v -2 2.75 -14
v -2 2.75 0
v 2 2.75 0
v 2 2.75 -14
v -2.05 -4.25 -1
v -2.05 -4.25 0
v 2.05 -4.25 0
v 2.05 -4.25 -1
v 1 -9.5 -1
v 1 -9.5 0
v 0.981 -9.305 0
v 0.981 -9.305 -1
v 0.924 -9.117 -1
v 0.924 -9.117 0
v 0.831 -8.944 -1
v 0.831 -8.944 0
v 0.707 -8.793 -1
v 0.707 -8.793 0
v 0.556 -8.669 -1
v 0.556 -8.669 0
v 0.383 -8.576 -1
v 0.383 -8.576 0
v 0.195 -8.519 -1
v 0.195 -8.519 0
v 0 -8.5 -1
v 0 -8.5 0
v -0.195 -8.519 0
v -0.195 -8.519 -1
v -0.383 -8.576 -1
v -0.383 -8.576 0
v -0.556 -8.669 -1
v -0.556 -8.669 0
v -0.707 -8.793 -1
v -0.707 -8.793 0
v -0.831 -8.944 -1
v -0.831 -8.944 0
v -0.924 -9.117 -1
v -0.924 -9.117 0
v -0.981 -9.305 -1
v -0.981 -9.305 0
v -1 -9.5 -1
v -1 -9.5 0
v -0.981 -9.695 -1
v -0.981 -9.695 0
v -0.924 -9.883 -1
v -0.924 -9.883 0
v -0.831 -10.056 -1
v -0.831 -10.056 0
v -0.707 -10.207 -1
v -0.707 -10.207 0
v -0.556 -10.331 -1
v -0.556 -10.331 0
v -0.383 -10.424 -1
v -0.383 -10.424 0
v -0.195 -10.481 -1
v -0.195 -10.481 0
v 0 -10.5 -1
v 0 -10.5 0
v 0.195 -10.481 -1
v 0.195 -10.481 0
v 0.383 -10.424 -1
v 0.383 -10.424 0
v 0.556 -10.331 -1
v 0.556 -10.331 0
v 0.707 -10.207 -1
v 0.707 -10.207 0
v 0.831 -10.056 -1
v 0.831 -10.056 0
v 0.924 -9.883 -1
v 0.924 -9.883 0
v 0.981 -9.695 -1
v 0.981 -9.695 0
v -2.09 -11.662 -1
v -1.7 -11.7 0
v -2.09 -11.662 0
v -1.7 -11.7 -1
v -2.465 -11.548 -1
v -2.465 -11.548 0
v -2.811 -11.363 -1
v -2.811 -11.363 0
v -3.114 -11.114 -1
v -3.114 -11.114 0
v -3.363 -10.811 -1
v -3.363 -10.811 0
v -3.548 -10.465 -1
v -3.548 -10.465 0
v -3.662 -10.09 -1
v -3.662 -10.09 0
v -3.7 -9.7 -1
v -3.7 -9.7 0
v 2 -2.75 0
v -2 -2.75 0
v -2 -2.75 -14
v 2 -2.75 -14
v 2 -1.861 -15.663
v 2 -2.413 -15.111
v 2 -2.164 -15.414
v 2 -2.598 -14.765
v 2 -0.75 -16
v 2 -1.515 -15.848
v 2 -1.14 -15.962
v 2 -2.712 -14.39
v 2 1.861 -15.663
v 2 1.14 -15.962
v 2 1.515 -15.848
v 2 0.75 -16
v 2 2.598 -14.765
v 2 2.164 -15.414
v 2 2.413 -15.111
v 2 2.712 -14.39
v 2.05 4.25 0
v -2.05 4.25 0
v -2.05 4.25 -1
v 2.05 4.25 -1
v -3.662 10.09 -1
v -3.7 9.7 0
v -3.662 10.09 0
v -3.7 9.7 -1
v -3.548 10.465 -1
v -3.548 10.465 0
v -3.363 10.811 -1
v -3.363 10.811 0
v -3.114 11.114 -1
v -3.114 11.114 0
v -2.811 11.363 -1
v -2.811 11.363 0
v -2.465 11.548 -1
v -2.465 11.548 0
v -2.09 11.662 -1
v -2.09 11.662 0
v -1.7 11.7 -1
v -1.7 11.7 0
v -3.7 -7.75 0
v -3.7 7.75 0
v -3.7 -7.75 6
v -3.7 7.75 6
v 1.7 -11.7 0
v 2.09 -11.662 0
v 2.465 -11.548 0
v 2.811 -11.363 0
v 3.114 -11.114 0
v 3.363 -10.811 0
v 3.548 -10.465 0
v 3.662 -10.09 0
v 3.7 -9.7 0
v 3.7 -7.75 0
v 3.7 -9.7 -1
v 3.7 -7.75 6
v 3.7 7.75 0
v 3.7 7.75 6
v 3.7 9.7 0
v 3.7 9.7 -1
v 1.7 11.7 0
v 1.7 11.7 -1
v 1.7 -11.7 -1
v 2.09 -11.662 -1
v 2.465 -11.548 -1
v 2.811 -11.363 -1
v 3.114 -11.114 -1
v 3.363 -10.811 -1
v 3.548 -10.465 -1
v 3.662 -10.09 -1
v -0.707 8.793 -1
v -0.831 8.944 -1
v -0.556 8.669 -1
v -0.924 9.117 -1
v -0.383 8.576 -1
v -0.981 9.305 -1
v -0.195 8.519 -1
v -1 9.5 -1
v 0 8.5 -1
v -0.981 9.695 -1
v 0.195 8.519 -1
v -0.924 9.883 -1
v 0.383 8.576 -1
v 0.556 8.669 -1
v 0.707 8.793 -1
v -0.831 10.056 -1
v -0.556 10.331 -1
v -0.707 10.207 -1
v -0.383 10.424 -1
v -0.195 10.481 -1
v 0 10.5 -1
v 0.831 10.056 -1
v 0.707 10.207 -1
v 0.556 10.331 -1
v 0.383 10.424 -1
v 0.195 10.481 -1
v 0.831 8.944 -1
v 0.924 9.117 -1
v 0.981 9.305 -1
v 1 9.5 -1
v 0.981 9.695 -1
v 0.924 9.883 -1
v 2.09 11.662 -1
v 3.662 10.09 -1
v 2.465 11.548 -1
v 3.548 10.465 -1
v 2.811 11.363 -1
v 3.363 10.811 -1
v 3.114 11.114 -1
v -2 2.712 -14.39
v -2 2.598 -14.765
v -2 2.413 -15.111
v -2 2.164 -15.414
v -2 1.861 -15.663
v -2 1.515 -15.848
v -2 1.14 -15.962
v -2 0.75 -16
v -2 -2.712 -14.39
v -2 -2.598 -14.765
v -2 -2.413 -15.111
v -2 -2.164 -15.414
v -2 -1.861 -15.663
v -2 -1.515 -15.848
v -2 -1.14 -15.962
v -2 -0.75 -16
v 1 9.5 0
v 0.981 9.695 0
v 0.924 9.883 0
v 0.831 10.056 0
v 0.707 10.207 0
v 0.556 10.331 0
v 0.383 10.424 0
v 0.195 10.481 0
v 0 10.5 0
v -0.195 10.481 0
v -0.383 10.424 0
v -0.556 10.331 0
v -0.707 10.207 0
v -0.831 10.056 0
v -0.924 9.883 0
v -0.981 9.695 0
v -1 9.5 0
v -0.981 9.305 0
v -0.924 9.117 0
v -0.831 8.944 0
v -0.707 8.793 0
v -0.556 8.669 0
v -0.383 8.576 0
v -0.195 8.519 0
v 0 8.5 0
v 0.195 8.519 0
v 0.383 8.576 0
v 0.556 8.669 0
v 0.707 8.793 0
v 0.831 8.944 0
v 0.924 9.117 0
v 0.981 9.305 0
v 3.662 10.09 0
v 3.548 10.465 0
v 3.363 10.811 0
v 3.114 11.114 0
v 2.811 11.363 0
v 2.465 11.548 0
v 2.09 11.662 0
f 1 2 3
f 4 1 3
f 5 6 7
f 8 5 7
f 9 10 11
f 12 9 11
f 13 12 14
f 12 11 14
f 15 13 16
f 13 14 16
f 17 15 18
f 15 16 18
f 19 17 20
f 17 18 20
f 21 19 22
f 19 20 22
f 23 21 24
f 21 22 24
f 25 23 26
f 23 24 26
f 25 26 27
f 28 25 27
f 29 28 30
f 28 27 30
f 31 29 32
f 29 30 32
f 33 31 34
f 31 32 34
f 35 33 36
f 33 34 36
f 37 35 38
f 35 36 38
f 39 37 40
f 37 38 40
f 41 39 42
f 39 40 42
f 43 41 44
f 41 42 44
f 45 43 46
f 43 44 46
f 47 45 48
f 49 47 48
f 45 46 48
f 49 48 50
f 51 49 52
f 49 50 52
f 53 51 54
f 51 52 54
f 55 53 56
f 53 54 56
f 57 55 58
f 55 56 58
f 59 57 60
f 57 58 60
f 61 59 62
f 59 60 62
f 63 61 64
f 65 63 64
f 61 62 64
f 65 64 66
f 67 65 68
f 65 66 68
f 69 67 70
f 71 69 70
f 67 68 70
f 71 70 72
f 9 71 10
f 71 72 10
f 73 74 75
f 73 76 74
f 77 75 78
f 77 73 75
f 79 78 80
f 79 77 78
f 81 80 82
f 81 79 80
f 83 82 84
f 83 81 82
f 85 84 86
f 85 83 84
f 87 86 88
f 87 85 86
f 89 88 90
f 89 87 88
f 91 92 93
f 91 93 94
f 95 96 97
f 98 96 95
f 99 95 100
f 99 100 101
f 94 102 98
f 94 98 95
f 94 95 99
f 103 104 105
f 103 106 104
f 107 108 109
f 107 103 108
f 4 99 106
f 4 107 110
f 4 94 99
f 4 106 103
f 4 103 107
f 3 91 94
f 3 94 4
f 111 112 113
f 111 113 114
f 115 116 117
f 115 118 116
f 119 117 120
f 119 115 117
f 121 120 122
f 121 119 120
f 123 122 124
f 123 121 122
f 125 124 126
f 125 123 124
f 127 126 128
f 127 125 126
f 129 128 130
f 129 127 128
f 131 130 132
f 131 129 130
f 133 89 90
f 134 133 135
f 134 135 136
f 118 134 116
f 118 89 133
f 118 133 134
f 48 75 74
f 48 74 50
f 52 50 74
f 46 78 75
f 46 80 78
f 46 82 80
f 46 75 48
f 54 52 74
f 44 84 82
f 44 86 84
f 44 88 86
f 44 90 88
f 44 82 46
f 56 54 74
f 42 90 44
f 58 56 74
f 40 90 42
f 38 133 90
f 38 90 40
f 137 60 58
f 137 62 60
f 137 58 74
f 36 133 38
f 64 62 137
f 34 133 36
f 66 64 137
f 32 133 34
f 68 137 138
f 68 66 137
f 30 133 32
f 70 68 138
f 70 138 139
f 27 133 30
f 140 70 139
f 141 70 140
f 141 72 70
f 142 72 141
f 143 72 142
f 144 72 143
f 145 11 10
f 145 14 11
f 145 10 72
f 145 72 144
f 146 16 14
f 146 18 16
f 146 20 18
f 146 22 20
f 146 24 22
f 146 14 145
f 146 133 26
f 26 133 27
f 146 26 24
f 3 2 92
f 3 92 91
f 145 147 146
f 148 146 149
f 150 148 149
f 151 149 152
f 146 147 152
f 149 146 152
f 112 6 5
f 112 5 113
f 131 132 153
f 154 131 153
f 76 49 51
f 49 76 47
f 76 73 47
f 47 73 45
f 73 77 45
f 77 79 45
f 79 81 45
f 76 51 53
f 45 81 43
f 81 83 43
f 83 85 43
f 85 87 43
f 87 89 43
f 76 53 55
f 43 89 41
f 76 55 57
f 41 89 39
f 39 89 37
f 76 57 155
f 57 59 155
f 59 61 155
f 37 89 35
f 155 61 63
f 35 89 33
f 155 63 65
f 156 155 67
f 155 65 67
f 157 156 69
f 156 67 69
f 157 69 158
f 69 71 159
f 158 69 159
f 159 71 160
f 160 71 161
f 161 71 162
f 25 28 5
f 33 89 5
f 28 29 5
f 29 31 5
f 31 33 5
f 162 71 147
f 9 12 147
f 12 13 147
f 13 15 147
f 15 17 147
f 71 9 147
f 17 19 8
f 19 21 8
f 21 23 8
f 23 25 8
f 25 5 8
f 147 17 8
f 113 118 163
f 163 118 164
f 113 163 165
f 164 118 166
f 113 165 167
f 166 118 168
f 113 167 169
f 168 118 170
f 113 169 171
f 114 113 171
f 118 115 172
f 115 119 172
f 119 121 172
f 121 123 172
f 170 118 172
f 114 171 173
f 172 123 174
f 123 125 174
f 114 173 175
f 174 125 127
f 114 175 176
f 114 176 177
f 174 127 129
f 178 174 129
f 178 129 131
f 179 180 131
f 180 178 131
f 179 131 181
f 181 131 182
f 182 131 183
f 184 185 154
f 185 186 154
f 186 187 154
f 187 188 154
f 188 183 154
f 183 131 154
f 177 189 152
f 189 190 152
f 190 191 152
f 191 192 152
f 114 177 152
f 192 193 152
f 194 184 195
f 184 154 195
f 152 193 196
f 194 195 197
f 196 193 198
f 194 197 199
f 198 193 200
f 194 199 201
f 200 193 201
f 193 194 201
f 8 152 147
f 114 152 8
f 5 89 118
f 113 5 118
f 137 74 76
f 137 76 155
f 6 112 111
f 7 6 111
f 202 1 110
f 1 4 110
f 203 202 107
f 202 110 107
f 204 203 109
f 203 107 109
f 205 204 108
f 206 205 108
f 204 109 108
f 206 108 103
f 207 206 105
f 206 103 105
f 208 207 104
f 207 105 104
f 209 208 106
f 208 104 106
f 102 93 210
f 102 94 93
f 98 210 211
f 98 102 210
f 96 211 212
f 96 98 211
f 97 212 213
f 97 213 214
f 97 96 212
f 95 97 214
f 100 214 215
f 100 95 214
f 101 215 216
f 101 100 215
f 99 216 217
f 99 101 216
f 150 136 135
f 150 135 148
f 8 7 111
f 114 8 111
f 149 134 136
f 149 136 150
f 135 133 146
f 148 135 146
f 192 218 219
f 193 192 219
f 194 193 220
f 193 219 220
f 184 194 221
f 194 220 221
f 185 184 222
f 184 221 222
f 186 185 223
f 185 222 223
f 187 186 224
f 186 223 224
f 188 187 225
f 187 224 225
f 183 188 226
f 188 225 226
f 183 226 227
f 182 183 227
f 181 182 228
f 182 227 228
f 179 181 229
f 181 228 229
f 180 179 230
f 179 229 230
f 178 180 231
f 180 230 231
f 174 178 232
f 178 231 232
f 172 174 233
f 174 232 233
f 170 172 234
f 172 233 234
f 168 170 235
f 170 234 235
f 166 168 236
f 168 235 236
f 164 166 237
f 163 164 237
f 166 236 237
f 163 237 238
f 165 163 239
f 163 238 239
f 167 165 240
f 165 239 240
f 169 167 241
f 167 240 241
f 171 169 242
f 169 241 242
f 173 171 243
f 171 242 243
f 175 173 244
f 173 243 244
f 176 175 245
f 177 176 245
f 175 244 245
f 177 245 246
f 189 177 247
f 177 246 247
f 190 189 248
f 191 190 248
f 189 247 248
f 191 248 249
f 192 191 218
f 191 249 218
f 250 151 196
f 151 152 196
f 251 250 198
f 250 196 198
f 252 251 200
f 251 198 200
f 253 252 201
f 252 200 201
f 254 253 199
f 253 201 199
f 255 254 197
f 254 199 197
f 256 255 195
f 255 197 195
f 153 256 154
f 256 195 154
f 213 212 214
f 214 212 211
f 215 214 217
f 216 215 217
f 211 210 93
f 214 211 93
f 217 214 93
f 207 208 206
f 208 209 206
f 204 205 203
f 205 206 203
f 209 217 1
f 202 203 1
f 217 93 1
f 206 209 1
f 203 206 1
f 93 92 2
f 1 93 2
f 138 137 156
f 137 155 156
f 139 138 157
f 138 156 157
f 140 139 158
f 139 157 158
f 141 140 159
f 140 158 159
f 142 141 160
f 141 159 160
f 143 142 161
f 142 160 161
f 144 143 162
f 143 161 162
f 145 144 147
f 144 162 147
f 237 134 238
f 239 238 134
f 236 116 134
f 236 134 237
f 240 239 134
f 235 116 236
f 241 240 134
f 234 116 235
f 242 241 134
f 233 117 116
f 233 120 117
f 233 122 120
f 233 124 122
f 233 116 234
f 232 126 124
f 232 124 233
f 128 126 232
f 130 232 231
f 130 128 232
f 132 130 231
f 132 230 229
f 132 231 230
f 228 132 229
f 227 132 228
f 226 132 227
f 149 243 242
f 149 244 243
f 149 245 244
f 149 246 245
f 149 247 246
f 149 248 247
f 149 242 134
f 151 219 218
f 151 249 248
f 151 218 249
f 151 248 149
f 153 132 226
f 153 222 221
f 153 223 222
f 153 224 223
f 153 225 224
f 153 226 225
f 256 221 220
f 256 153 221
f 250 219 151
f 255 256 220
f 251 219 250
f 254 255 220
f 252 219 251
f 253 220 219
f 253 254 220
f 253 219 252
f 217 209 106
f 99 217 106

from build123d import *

# Parameters (mm, degrees)
F0_W     = 4
F0_H     = 5.5
F1_DEPTH = 16
F0_W_2   = 7.4
F0_H_2   = 15.5
F0_W_3   = 4.1
F0_H_3   = 8.5
F0_H_4   = 3.95
F0_R     = 1
F2_DEPTH = 1
F3_R     = 2
F4_DEPTH = 6
F5_R     = 2


with BuildPart() as f1:
    # F0 (on Top) → F1 (new body)
    with BuildSketch(Plane.XY):
        Rectangle(F0_W, F0_H)
    extrude(amount=-F1_DEPTH)

    # F5
    f5_edges = [f1.edges().sort_by_distance(p)[0] for p in [
        (0, 2.75, -16),
        (0, -2.75, -16),
    ]]
    fillet(f5_edges, radius=F5_R)


with BuildPart() as f2:
    # F0 (on Top) → F2 (new body)
    with BuildSketch(Plane.XY):
        Rectangle(F0_W_2, F0_H_2)
        Rectangle(F0_W_3, F0_H_3, mode=Mode.SUBTRACT)
        with Locations((0, -9.725)):
            Rectangle(F0_W_2, F0_H_4)
        with Locations((0, -9.5)):
            Circle(F0_R, mode=Mode.SUBTRACT)
        with Locations((0, 9.725)):
            Rectangle(F0_W_2, F0_H_4)
        with Locations((0, 9.5)):
            Circle(F0_R, mode=Mode.SUBTRACT)
    extrude(amount=-F2_DEPTH)

    # F3
    f3_edges = [f2.edges().sort_by_distance(p)[0] for p in [
        (3.7, 11.7, -0.5),
        (-3.7, 11.7, -0.5),
        (3.7, -11.7, -0.5),
        (-3.7, -11.7, -0.5),
    ]]
    fillet(f3_edges, radius=F3_R)

    # F0 (on Top) → F4 (join)
    with BuildSketch(Plane.XY):
        Rectangle(F0_W_2, F0_H_2)
        Rectangle(F0_W_3, F0_H_3, mode=Mode.SUBTRACT)
        Rectangle(F0_W_3, F0_H_3)
        Rectangle(F0_W, F0_H, mode=Mode.SUBTRACT)
        Rectangle(F0_W, F0_H)
    extrude(amount=F4_DEPTH)


solid = Compound([f1.part, f2.part])
